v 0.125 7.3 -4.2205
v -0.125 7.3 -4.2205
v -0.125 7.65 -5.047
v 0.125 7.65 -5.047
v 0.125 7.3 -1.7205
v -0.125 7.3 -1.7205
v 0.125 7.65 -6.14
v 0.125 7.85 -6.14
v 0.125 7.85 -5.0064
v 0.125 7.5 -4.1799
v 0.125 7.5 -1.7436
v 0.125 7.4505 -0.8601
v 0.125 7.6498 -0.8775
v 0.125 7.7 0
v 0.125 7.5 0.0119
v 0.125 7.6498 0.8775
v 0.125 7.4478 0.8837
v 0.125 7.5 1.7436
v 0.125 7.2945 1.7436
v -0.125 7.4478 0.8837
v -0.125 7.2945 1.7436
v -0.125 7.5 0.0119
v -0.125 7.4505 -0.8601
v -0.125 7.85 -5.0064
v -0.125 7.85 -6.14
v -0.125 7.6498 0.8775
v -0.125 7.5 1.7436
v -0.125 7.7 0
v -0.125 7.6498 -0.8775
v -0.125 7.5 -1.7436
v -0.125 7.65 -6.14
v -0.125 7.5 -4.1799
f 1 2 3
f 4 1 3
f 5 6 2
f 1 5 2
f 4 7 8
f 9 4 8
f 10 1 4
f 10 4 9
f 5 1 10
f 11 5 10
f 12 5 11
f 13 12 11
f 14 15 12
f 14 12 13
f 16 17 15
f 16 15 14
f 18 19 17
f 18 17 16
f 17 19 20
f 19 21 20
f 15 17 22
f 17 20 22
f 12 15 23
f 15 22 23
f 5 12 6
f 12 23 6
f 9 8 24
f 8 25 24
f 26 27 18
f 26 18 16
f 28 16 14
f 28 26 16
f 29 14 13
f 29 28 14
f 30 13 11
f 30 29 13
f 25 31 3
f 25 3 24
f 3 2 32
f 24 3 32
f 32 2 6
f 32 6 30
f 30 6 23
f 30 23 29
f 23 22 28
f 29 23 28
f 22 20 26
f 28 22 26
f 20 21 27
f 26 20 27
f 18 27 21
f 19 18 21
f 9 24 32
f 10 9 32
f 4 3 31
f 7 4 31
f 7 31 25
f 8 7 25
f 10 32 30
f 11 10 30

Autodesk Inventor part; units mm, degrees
ref_plane "YZ Plane" through (0, 0, 0) normal (1, 0, 0) x (0, 1, 0)
ref_plane "XZ Plane" through (0, 0, 0) normal (0, 1, 0) x (-1, 0, 0)
ref_plane "XY Plane" through (0, 0, 0) normal (0, 0, 1) x (1, 0, 0)
sketch "Sketch1" plane through (0, 0, 0) normal (1, 0, 0) x (0, 1, 0)
  line L0 (7.85, -6.14) -> (7.85, -5.0064)
  line L1 (7.85, -5.0064) -> (7.5, -4.1799)
  line L2 (7.5, -4.1799) -> (7.5, -1.7436)
  arc A0 (7.5, -1.7436) -> (7.5, 1.7436) centre (0, 0) ccw
  line L3 (7.5, 1.7436) -> (7.2945, 1.7436)
  arc A1 (7.3, -1.7205) -> (7.2945, 1.7436) centre (0, 0) ccw
  line L4 (7.3, -1.7205) -> (7.3, -4.2205)
  line L5 (7.3, -4.2205) -> (7.65, -5.047)
  line L6 (7.65, -5.047) -> (7.65, -6.14)
  line L7 (7.65, -6.14) -> (7.85, -6.14)
  line L8 (7.7, 1) -> (7.7, -1) construction
  point P0 (7.3973, 1.7436)
  point P1 (7.7, 0)
  point P2 (7.75, -6.14)
  dimension "d19" = 0.2
  dimension "d20" = 0.2
  dimension "d21" = 0.2
  dimension "d25" = 6.75
  dimension "d26" = 1.093
  dimension "d27" = 2.5
  dimension "d29" = 2
  dimension "d31" = 7.5
  dimension "d35" = 0.2
  dimension "d38" = 0.4
  dimension "d39" = 0.25
extrude "Extrusion1" add sketch "Sketch1" along normal mid plane 0.25
properties part number "pins2" material "Copper"
